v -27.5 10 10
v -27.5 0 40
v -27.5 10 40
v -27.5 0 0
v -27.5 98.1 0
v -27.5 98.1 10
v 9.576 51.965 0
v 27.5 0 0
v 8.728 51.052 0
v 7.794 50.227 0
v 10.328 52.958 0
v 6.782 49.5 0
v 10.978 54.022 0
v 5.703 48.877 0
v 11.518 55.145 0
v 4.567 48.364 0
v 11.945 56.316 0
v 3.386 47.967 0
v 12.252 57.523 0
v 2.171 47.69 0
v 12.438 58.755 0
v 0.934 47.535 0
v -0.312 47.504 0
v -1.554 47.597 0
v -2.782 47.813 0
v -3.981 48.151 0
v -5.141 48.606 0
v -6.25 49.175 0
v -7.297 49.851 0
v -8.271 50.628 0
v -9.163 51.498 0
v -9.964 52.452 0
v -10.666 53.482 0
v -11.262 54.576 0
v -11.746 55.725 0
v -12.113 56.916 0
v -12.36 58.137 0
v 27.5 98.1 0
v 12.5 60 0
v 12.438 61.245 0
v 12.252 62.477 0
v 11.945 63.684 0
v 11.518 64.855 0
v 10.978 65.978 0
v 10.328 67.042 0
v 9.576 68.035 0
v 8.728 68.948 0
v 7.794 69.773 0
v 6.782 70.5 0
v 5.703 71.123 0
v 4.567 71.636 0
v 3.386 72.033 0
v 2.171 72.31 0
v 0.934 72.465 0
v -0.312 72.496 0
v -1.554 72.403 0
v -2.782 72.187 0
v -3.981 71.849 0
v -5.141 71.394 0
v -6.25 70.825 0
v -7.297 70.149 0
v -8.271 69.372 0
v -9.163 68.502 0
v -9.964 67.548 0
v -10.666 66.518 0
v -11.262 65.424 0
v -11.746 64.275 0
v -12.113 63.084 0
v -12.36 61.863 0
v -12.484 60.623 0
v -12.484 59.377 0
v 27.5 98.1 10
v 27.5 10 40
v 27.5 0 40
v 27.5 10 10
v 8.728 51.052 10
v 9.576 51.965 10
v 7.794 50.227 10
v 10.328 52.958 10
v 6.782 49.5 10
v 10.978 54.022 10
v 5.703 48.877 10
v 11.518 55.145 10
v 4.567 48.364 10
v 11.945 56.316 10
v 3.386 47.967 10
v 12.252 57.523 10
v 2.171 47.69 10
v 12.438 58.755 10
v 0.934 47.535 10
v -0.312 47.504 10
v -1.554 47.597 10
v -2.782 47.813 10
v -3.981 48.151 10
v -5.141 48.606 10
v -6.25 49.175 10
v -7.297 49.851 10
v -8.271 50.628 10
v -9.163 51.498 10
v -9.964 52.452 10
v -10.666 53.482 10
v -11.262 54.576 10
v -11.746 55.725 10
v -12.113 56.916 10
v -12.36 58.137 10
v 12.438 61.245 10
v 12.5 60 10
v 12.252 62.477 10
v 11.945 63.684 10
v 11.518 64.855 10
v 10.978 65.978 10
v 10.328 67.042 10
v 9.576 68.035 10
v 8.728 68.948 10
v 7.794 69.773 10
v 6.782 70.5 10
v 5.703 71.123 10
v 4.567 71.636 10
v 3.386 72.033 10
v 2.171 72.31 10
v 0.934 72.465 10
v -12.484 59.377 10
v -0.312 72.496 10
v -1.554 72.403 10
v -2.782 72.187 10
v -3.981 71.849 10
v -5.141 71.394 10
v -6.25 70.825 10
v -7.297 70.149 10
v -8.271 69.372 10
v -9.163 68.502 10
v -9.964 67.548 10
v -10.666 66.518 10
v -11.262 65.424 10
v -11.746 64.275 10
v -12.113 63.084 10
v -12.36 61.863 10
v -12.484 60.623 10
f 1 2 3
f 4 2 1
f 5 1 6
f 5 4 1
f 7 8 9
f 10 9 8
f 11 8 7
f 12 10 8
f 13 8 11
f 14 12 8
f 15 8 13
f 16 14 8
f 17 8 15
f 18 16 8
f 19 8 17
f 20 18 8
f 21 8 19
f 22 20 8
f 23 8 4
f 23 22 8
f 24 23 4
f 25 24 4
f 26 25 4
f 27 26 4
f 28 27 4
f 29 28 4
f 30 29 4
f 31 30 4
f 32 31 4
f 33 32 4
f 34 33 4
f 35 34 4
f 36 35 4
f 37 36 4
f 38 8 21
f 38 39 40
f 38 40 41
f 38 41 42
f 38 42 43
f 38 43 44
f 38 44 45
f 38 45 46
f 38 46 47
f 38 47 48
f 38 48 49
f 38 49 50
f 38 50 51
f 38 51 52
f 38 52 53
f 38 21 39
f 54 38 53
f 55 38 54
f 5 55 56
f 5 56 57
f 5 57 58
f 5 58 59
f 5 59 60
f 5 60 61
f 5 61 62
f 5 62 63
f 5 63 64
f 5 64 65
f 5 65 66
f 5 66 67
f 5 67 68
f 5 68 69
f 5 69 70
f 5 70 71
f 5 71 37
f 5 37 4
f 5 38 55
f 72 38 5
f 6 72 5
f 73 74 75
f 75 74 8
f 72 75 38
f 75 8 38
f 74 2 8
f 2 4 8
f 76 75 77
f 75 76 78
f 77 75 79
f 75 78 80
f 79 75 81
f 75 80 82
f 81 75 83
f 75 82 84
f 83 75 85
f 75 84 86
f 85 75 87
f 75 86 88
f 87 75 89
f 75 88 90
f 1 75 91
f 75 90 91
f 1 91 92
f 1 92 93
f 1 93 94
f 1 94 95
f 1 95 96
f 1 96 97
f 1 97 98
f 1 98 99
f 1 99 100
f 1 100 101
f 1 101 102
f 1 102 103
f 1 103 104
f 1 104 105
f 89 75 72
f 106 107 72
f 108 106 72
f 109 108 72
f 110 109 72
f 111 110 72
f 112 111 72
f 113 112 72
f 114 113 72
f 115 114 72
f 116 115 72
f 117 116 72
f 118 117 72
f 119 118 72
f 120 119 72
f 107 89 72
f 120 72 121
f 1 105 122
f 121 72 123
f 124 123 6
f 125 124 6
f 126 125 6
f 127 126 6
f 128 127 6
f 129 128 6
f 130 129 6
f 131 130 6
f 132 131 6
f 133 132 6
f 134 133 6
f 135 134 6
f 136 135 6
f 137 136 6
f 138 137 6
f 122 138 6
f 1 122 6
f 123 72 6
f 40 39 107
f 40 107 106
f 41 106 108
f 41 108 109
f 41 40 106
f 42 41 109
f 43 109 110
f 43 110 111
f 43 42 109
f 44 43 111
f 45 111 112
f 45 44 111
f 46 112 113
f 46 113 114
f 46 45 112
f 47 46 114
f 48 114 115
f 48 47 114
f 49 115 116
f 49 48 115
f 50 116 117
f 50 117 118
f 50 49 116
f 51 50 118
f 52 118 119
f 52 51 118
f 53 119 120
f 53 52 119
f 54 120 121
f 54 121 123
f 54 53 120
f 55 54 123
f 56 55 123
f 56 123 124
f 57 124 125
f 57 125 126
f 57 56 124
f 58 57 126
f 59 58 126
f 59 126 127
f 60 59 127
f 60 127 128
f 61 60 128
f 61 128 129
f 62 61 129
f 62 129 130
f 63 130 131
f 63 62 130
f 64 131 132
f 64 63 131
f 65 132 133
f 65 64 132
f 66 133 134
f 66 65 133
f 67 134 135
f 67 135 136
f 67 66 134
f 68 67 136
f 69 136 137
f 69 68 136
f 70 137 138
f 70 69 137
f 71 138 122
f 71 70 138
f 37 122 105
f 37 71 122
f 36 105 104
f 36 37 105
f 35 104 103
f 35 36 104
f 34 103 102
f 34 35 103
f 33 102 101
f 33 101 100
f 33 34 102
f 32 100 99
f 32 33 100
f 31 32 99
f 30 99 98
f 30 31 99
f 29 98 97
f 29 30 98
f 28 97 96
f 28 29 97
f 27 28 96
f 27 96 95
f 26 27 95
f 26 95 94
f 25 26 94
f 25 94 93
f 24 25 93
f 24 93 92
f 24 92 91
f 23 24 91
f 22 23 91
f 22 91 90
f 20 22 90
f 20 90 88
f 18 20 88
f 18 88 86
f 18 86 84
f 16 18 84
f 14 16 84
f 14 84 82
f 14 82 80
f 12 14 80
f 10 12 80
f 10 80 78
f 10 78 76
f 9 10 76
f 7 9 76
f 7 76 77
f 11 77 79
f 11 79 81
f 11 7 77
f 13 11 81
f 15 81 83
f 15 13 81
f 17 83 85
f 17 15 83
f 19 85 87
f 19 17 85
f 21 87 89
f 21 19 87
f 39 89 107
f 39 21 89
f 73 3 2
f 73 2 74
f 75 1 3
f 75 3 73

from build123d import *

# Parameters (mm, degrees)
CROQUIS1_R              = 12.5
SALIENTE_EXTRUIR1_DEPTH = 10
CROQUIS2_W              = 55
CROQUIS2_H              = 10
SALIENTE_EXTRUIR2_DEPTH = 30


with BuildPart() as part:
    # Croquis1 → Saliente-Extruir1 (new body)
    with BuildSketch(Plane.XY):
        Polygon((0, 98.1), (27.5, 98.1), (27.5, 0), (-27.5, 0), (-27.5, 98.1), align=None)
        with Locations((0, 60)):
            Circle(CROQUIS1_R, mode=Mode.SUBTRACT)
    extrude(amount=SALIENTE_EXTRUIR1_DEPTH)

    # Croquis2 → Saliente-Extruir2 (add)
    with BuildSketch(Plane.XY.offset(10)):
        with Locations((0, 5)):
            Rectangle(CROQUIS2_W, CROQUIS2_H)
    extrude(amount=SALIENTE_EXTRUIR2_DEPTH)


solid = part.part
